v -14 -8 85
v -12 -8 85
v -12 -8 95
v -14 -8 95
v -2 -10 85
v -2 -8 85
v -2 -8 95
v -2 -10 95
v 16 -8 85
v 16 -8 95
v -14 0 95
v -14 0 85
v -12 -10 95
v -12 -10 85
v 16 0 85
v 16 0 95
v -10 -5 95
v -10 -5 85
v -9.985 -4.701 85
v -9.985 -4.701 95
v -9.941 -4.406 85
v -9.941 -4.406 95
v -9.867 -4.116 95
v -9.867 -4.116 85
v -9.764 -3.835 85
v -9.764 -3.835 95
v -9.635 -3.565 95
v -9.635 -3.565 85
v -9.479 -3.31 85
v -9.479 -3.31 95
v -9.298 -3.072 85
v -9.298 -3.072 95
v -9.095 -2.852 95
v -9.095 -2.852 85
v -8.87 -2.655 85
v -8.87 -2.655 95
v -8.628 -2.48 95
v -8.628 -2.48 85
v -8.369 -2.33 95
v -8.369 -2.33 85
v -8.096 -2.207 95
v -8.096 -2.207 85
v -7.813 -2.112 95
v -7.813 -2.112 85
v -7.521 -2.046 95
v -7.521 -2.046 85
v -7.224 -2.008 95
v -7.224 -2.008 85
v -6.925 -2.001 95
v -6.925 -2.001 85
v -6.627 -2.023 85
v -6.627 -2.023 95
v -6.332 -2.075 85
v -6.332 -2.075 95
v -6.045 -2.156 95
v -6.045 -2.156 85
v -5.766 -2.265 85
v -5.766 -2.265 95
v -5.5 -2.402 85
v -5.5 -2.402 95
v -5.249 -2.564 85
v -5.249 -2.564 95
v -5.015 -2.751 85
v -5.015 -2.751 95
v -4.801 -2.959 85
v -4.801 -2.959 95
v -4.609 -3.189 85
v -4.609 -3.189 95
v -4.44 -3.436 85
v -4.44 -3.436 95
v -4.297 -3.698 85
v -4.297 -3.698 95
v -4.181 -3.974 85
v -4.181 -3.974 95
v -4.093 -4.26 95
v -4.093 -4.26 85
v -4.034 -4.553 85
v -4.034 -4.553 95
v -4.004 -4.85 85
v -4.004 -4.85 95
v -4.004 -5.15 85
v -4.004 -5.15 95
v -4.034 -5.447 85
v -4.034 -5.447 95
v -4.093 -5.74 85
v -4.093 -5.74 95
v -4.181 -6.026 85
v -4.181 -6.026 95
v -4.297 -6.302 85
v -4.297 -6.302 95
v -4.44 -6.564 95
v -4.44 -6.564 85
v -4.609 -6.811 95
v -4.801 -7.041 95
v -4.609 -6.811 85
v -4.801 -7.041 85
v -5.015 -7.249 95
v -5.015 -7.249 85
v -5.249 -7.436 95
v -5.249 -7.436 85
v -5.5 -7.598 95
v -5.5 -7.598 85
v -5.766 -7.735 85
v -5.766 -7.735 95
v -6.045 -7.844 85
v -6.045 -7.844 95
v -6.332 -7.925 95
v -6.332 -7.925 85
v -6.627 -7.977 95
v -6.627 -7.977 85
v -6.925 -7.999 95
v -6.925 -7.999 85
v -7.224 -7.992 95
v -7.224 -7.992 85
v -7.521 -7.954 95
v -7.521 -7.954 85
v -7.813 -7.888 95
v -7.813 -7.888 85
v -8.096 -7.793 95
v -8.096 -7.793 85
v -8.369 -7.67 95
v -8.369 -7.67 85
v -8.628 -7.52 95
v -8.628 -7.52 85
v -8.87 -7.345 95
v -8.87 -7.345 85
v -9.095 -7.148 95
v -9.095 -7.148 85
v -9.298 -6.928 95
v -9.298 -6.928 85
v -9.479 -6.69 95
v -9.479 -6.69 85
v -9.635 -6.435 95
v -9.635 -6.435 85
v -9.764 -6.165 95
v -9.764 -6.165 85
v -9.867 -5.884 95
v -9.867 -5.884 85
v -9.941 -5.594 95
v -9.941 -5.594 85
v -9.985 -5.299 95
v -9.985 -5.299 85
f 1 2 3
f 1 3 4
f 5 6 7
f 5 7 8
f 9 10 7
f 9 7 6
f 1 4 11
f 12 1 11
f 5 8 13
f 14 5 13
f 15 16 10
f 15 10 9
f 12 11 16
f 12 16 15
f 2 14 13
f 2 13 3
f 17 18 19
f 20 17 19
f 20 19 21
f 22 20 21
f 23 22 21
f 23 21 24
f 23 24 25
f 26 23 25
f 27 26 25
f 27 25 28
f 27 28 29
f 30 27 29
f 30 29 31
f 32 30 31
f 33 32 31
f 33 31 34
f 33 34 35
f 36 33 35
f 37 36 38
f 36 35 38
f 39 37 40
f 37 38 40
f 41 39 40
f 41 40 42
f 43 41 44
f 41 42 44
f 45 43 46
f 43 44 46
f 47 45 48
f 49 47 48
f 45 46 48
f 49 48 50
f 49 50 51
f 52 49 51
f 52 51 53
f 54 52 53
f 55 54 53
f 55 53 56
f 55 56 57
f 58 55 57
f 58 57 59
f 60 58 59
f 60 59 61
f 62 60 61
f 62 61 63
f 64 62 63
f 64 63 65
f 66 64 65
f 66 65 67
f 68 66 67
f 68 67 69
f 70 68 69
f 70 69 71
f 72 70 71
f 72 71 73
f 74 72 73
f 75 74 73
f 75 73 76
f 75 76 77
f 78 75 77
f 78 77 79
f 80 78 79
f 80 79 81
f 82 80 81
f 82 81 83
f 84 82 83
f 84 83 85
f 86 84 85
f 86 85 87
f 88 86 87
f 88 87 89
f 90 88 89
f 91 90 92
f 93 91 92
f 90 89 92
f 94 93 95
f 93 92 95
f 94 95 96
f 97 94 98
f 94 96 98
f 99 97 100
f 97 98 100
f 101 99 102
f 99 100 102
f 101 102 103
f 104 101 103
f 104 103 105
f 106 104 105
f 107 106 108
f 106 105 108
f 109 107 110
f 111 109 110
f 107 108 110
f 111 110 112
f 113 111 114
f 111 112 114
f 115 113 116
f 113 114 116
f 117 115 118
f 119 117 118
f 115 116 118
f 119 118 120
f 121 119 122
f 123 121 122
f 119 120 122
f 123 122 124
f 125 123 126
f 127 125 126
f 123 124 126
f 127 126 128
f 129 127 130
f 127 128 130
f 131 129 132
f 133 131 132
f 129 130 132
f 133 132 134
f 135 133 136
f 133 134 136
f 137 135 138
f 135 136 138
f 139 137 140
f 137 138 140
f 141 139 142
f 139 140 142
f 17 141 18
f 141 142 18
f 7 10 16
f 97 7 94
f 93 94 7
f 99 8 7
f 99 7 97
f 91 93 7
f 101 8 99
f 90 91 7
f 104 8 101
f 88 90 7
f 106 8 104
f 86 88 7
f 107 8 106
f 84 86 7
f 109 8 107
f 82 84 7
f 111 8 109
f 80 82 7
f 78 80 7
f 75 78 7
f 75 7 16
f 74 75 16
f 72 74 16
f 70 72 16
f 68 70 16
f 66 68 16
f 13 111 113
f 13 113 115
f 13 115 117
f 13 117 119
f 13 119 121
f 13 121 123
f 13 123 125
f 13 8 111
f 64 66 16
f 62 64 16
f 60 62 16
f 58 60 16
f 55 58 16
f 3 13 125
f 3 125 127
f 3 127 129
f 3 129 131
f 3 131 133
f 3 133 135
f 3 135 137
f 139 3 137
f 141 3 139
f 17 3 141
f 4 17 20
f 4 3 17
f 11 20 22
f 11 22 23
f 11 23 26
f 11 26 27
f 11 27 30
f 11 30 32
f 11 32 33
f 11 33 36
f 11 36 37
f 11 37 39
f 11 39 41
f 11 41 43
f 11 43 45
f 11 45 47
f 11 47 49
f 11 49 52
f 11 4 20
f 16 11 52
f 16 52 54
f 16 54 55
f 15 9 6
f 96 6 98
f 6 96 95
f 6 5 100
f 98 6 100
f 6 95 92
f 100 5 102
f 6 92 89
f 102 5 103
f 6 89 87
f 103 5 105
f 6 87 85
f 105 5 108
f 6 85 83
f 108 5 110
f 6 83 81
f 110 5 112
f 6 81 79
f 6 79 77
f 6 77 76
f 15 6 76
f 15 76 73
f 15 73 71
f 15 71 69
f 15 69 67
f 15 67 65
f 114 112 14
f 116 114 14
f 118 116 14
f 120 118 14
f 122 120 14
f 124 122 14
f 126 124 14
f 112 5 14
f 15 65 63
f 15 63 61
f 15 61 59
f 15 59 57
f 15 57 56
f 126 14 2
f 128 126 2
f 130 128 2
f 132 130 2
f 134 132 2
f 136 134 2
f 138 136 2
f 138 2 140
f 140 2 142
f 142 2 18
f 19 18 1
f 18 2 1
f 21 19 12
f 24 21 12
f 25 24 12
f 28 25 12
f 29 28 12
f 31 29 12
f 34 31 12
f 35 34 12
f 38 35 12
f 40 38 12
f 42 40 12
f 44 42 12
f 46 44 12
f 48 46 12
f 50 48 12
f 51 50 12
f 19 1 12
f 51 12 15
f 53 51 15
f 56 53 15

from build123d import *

# Parameters (mm, degrees)
EXTRUDE_1_DEPTH     = 10
CUT_EXTRUDE_1_REACH = 21.9
SKETCH_3_R          = 3
SKETCH_4_W          = 10
SKETCH_4_H          = 8
EXTRUDE_2_DEPTH     = 16


with BuildPart() as part:
    # 草图2 → 凸台-拉伸1 (new body)
    with BuildSketch(Plane(origin=(0, 0, 95), x_dir=(-1, 0, 0), z_dir=(0, 0, -1))):
        Polygon((2, -10), (12, -10), (12, -8), (14, -8), (14, 0), (0, 0), (0, -8), (2, -8), align=None)
    extrude(amount=EXTRUDE_1_DEPTH)

    # 草图3 → 切除-拉伸1 (cut, up to next)
    with BuildSketch(Plane(origin=(0, 0, 85), x_dir=(-1, 0, 0), z_dir=(0, 0, -1)), mode=Mode.PRIVATE) as cut_extrude_1_sk1:
        with Locations((7, -5)):
            Circle(SKETCH_3_R)
    cut_extrude_1_tool1 = extrude(cut_extrude_1_sk1.sketch, amount=-CUT_EXTRUDE_1_REACH, mode=Mode.PRIVATE) & part.part
    add(cut_extrude_1_tool1.solids().sort_by_distance((-7, -5, 85))[0], mode=Mode.SUBTRACT)

    # 草图4 → 凸台-拉伸2 (add)
    with BuildSketch(Plane(origin=(0, 0, 0), x_dir=(0, 0, -1), z_dir=(1, 0, 0))):
        with Locations((-90, -4)):
            Rectangle(SKETCH_4_W, SKETCH_4_H)
    extrude(amount=EXTRUDE_2_DEPTH)


solid = part.part
